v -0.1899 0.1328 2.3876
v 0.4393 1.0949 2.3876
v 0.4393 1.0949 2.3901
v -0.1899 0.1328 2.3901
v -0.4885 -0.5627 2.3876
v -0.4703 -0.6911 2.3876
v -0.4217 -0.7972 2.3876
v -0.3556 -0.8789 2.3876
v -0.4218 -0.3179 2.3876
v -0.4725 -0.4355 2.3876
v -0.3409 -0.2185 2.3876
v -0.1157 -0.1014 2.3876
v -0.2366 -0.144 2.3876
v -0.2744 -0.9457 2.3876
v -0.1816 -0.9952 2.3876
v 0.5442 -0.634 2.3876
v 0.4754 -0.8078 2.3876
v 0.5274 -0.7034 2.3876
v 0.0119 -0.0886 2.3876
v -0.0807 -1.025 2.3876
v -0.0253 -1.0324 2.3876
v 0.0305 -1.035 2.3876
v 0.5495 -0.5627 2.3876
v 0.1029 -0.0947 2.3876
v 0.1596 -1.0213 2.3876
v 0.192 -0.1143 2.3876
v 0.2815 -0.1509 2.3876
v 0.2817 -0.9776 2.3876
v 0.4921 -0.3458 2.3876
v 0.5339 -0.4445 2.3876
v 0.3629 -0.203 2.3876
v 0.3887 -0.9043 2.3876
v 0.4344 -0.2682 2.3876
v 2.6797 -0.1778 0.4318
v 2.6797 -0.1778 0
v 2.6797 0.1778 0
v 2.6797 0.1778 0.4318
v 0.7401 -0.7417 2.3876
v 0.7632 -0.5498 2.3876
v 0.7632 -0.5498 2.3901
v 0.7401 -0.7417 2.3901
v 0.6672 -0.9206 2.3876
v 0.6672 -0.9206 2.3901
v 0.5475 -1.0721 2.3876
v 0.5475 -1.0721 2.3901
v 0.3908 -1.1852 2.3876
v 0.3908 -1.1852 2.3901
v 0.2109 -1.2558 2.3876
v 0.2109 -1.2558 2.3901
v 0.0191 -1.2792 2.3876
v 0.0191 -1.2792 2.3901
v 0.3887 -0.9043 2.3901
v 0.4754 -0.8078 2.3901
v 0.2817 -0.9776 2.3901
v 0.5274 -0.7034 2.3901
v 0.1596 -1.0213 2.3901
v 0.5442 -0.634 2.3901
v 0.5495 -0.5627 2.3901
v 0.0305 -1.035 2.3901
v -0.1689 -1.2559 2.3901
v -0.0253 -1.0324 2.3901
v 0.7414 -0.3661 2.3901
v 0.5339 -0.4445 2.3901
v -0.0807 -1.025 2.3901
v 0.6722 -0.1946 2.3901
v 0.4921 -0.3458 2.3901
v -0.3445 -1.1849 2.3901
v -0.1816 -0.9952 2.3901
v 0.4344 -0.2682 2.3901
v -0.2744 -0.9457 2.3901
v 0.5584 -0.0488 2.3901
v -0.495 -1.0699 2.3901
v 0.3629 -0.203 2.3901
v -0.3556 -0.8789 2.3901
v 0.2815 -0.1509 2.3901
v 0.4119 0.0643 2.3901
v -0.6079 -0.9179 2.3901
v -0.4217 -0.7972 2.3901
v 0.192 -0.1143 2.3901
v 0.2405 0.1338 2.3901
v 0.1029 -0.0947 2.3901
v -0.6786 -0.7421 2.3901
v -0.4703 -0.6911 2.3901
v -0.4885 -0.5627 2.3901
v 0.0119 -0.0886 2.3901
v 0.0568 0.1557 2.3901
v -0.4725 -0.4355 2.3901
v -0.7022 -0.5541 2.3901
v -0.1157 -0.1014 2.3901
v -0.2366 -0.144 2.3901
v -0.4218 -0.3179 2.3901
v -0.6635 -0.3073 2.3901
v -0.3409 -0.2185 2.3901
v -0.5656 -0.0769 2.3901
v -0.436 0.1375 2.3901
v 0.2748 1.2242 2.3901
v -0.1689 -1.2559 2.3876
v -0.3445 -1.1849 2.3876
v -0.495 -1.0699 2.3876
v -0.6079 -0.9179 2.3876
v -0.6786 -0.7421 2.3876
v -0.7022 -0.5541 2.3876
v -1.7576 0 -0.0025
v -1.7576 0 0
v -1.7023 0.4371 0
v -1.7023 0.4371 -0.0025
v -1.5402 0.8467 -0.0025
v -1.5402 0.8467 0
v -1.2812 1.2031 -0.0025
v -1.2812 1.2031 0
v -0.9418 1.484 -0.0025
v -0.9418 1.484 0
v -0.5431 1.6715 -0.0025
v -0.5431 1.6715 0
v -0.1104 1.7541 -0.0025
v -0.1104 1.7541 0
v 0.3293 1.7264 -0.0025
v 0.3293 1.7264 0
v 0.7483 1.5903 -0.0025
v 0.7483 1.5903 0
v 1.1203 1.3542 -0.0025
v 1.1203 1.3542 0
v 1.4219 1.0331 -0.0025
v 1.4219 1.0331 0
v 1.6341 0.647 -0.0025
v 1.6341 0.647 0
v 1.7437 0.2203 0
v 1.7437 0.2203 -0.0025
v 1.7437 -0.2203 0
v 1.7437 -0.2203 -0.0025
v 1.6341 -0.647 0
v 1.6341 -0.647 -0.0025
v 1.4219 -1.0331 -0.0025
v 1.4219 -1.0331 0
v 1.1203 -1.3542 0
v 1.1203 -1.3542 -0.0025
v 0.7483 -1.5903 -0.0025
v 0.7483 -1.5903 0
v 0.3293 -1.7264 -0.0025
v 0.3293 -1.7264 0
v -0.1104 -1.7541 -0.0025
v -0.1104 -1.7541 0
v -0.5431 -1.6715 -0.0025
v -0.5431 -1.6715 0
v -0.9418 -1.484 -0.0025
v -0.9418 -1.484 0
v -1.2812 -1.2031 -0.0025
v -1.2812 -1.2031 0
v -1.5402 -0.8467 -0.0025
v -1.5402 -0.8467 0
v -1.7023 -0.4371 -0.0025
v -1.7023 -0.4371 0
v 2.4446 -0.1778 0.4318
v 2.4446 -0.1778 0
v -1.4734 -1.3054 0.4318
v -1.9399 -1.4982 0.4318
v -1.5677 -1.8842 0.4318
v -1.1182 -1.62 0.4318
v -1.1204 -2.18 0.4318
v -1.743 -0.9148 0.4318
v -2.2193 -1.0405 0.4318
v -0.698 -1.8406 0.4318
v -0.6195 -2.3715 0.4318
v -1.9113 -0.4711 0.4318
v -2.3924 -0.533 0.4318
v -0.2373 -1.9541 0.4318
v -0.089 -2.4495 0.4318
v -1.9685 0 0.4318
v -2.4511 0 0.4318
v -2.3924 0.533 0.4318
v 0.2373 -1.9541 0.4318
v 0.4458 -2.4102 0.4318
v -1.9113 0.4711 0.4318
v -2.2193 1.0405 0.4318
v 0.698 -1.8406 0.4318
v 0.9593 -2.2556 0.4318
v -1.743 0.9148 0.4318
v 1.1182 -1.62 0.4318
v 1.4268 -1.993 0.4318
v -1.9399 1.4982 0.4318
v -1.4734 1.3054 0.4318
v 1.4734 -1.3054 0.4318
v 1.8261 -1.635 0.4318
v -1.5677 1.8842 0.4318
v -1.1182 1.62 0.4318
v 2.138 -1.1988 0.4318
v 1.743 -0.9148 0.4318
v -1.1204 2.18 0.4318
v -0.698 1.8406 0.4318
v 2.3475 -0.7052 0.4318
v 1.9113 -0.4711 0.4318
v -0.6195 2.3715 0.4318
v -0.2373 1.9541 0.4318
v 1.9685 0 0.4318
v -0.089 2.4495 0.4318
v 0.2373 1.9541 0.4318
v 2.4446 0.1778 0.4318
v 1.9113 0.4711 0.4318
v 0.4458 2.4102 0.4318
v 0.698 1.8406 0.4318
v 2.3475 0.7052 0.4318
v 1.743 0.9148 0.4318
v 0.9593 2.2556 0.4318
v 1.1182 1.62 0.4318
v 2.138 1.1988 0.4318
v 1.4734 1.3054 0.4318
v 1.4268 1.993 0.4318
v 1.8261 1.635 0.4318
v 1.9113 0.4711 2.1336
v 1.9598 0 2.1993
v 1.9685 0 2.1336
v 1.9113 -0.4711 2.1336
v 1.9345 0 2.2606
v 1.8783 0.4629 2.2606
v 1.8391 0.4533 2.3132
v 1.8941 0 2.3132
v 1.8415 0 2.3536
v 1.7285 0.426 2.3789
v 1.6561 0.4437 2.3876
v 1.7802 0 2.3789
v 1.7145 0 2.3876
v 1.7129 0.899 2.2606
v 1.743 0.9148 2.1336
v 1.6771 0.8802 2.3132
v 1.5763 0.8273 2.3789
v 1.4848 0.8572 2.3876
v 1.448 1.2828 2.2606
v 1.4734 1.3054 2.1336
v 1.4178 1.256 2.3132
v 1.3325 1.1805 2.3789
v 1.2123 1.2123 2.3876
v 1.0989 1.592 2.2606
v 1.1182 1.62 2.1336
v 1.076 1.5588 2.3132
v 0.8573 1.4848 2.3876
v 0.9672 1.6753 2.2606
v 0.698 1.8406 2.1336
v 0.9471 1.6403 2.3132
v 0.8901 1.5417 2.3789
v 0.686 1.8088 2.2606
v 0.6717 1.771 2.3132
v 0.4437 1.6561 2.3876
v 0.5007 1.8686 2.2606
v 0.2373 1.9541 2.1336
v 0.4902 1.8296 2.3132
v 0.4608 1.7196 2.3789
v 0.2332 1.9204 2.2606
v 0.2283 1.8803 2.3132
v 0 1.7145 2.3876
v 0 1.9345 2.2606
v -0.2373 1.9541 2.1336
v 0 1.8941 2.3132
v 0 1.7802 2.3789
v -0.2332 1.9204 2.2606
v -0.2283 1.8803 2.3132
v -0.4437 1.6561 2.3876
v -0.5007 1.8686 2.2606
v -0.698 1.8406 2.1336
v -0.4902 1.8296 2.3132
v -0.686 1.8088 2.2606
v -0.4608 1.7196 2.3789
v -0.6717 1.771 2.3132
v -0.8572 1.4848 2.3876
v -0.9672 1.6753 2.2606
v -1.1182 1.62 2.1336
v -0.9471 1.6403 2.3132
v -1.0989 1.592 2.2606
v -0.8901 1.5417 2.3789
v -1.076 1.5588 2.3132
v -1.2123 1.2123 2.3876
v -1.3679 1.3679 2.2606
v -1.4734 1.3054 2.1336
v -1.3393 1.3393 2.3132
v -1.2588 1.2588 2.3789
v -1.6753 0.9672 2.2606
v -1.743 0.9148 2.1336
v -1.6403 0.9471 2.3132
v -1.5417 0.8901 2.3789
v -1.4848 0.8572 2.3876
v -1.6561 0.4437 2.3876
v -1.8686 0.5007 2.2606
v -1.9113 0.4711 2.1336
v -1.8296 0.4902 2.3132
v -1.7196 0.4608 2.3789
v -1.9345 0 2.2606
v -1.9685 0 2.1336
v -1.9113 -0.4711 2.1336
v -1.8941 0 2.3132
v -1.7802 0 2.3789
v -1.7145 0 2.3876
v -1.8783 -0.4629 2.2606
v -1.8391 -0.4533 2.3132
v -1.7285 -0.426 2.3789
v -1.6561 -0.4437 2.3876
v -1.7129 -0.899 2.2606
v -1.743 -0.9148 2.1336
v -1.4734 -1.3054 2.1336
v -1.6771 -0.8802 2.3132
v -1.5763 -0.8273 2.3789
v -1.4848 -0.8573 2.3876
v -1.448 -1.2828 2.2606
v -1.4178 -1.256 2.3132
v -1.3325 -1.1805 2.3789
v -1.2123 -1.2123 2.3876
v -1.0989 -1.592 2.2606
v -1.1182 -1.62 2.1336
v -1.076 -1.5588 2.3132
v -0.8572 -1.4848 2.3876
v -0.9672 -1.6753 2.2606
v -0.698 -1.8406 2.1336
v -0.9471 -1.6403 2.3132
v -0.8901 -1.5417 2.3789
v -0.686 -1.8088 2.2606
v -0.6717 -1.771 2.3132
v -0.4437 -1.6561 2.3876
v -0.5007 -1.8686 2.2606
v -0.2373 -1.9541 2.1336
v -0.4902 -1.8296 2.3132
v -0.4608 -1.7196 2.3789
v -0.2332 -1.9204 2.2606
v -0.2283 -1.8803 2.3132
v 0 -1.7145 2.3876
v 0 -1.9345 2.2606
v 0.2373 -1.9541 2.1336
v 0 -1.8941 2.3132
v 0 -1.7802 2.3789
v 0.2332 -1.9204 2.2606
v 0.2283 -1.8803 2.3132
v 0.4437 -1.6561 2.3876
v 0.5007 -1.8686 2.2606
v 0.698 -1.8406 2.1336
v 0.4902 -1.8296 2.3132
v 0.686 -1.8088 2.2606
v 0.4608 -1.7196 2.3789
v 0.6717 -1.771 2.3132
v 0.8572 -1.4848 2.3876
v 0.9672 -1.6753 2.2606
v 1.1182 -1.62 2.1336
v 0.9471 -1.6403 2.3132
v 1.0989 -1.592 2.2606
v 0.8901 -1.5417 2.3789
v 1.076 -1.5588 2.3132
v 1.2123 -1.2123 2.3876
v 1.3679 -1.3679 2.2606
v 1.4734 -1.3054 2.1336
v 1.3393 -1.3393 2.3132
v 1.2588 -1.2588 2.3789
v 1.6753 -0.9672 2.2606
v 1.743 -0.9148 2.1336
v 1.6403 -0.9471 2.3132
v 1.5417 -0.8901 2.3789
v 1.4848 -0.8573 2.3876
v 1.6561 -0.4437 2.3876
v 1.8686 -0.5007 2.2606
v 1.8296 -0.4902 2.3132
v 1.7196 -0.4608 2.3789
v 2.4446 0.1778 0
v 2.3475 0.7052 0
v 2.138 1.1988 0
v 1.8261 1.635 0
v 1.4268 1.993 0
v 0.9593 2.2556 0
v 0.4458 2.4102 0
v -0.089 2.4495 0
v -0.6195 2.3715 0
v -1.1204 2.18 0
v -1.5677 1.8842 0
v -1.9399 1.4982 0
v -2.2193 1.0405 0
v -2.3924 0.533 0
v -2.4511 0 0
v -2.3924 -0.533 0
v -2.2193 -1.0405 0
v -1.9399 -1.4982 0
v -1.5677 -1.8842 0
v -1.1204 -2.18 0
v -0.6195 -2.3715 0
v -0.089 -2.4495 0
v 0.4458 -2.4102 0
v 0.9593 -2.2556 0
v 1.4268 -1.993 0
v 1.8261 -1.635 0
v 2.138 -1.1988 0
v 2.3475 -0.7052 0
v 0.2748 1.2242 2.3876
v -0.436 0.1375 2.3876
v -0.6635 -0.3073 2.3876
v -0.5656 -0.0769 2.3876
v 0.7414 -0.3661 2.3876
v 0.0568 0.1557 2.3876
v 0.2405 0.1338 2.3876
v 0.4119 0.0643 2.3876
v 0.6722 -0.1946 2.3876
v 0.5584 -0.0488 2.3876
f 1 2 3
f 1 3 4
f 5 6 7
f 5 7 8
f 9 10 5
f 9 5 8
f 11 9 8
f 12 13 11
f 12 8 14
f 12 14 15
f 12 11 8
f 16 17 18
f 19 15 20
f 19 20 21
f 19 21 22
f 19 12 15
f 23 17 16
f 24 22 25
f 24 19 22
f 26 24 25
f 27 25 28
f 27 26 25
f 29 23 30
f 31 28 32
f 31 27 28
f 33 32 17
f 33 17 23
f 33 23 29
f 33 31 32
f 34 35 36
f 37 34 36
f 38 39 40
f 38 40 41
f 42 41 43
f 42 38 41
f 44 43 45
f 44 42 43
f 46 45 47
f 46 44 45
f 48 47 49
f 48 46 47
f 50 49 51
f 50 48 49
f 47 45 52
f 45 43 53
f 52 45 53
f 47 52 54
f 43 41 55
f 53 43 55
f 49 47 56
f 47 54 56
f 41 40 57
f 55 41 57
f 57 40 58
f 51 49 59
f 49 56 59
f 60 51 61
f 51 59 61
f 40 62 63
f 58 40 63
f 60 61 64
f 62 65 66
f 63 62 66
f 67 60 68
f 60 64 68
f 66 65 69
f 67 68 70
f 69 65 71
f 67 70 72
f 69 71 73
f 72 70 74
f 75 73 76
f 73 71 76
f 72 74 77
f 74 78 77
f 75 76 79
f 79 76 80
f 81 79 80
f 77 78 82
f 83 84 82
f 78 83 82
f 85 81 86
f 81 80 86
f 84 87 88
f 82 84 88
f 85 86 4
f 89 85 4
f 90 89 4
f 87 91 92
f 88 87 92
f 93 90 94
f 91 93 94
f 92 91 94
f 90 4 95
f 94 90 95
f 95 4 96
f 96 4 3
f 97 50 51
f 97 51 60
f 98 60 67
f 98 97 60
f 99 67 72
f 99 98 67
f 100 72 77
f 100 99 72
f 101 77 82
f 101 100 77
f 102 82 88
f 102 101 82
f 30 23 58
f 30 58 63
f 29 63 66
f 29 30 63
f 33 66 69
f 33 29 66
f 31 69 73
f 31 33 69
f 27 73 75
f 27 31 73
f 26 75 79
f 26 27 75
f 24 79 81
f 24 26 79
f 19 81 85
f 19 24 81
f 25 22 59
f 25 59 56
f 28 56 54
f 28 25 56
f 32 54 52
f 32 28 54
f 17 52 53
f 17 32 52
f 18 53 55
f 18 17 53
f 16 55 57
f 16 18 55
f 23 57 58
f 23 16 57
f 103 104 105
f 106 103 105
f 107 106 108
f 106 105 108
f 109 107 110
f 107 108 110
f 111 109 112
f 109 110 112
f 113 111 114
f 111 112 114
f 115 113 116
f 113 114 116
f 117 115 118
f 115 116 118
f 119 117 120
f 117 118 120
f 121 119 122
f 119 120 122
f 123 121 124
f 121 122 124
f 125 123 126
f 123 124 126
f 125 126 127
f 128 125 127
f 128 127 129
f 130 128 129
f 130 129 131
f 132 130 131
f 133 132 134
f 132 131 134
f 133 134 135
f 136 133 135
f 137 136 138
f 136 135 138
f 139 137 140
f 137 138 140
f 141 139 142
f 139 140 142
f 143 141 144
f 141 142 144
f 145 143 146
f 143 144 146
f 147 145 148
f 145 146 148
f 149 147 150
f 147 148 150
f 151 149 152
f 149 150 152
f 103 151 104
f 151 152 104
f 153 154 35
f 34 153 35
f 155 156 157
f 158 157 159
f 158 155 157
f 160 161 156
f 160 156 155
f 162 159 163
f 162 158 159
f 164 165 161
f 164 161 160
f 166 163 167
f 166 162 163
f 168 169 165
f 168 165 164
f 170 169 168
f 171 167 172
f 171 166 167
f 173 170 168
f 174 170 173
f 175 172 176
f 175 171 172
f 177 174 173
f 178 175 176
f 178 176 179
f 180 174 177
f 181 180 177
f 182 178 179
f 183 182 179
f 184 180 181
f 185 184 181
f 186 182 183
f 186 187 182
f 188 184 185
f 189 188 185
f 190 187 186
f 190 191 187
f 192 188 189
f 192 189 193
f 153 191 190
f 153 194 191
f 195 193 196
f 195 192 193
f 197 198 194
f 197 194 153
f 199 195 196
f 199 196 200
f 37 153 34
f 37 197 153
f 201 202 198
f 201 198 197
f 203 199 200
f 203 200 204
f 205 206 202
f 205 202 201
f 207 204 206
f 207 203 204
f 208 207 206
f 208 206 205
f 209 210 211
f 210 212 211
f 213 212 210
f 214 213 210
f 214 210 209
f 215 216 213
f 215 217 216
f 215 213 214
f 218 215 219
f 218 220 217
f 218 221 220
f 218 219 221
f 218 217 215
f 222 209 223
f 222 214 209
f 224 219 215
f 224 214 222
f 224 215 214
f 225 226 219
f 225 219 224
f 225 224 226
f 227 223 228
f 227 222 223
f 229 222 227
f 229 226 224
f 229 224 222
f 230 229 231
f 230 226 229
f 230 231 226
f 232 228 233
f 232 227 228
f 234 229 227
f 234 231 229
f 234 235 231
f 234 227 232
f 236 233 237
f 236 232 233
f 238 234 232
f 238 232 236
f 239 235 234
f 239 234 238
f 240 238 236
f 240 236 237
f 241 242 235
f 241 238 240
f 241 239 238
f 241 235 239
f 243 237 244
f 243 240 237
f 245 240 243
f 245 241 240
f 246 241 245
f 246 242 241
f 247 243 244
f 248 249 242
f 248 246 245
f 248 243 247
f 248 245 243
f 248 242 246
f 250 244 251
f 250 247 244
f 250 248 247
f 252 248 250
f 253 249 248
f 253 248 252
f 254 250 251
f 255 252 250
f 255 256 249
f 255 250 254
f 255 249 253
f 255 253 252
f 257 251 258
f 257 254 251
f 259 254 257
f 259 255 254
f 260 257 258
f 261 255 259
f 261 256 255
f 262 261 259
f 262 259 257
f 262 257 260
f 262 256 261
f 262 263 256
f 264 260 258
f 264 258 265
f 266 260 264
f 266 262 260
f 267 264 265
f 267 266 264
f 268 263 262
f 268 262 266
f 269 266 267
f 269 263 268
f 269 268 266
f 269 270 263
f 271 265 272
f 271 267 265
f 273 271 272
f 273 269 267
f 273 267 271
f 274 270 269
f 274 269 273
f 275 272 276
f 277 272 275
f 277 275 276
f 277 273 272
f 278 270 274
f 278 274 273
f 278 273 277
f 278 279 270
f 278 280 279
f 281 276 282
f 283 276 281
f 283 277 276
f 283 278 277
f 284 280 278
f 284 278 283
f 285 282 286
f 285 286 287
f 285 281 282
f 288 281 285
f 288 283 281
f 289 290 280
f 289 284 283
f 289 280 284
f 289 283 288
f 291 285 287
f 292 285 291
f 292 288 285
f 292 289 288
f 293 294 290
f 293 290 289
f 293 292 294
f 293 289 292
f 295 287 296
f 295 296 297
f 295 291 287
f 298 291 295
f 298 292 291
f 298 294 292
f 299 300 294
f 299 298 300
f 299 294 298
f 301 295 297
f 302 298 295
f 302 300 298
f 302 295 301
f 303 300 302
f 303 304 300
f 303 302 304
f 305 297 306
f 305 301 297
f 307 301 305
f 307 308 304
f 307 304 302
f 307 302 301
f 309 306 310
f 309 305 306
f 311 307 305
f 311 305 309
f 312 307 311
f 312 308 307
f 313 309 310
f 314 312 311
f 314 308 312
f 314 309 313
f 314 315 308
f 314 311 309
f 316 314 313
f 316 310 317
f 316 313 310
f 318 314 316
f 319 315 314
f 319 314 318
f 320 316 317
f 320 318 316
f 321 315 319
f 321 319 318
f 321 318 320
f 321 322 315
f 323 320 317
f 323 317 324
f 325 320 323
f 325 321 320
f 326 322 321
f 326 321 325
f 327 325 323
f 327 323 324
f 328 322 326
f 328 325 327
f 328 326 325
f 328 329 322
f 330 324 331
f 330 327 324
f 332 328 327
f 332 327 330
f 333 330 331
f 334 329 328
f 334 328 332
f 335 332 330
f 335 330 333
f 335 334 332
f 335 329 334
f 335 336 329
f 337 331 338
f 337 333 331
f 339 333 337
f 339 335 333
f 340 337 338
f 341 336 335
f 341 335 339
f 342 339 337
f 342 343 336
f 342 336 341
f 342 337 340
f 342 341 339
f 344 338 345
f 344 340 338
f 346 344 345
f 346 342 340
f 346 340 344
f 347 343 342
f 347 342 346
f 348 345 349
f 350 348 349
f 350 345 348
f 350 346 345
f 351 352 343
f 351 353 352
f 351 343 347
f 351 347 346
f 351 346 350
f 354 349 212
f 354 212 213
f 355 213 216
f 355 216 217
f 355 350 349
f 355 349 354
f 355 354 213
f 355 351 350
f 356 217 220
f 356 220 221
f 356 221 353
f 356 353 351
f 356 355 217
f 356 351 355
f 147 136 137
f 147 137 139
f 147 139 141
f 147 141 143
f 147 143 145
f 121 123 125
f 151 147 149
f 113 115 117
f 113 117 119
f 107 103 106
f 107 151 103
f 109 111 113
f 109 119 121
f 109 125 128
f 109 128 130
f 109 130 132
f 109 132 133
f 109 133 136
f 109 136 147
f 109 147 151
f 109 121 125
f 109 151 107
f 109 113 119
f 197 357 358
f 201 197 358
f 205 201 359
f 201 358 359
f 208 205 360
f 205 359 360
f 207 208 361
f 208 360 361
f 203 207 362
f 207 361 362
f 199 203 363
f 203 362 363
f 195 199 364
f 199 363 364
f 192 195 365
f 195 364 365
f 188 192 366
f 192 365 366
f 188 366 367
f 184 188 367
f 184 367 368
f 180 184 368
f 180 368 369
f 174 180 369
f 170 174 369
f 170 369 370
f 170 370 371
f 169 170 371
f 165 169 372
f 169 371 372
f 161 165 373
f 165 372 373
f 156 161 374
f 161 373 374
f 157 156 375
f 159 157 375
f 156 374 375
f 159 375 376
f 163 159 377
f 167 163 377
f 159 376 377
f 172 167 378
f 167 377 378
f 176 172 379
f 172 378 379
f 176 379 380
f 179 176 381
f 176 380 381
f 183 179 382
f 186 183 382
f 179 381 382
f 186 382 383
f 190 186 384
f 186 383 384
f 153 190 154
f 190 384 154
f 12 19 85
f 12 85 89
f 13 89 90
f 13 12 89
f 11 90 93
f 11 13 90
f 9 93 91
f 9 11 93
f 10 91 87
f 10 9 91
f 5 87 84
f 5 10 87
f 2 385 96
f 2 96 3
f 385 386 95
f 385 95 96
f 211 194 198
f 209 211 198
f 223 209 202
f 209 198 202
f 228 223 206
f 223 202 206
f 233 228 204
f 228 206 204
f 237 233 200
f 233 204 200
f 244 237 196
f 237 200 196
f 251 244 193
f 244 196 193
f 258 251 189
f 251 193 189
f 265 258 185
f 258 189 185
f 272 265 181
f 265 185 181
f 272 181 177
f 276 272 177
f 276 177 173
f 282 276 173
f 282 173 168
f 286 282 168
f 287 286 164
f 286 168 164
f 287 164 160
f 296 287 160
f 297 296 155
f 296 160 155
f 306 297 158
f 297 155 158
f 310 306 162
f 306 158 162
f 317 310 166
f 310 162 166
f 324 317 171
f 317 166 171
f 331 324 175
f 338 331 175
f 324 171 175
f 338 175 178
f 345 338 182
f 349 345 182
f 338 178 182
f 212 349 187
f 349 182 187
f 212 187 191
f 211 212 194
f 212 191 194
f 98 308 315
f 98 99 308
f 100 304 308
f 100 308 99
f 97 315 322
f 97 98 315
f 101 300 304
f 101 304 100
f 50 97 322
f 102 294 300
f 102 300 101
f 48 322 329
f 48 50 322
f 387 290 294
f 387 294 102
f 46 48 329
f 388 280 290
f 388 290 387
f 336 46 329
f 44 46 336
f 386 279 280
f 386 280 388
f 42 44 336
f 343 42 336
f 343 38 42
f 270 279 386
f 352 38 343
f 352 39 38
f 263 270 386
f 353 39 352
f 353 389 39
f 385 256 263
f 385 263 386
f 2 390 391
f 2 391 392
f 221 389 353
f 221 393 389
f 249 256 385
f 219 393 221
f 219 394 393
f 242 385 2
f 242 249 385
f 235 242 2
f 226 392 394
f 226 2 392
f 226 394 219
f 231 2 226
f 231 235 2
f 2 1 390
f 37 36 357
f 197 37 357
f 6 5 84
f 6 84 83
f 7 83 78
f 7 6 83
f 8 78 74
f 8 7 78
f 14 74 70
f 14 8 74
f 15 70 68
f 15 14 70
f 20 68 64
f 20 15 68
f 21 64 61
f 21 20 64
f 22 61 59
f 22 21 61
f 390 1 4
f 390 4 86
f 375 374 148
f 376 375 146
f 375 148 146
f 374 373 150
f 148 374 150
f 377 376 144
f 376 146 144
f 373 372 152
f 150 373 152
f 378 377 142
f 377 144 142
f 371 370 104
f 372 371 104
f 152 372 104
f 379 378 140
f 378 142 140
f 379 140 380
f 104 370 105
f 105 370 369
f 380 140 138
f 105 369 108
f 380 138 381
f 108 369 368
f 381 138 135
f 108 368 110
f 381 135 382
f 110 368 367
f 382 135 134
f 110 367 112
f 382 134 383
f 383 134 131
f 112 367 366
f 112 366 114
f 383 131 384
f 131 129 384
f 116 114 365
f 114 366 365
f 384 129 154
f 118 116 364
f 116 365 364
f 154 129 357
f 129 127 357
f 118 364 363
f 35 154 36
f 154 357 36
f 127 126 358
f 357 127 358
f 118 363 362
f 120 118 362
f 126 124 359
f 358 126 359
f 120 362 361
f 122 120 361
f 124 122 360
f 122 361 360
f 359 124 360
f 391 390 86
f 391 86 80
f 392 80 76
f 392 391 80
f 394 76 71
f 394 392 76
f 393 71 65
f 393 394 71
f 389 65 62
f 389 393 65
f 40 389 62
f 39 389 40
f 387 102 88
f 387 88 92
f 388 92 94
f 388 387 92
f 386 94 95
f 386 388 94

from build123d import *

# Parameters (mm, degrees)
BOSS_EXTRUDE1_DEPTH = 0.4318
SKETCH2_R           = 1.9685
BOSS_EXTRUDE2_DEPTH = 1.9558
SKETCH3_R           = 1.757566481
BOSS_EXTRUDE3_DEPTH = 0.00254
FILLET1_R           = 0.254
BOSS_EXTRUDE6_DEPTH = 0.00254


with BuildPart() as part:
    # Sketch1 → Boss-Extrude1 (new body)
    with BuildSketch(Plane.XY):
        with BuildLine():
            Line((2.6797, 0.1778), (2.4511, 0.1778))
            Line((2.4511, 0.1778), (2.44464279, 0.1778))
            ThreePointArc((2.44464279, 0.1778), (-2.4511, 0), (2.44464279, -0.1778))
            Line((2.44464279, -0.1778), (2.4511, -0.1778))
            Line((2.4511, -0.1778), (2.6797, -0.1778))
            Line((2.6797, -0.1778), (2.6797, 0.1778))
        make_face()
    extrude(amount=BOSS_EXTRUDE1_DEPTH)

    # Sketch2 → Boss-Extrude2 (add)
    with BuildSketch(Plane.XY.offset(0.4318)):
        Circle(SKETCH2_R)
    extrude(amount=BOSS_EXTRUDE2_DEPTH)

    # Sketch3 → Boss-Extrude3 (add)
    with BuildSketch(Plane(origin=(0, 0, 0), x_dir=(-1, 0, 0), z_dir=(0, 0, -1))):
        Circle(SKETCH3_R)
    extrude(amount=BOSS_EXTRUDE3_DEPTH)

    # Fillet1
    fillet1_edges = [part.edges().sort_by_distance(p)[0] for p in [
        (-1.9685, 0, 2.3876),
    ]]
    fillet(fillet1_edges, radius=FILLET1_R)

    # Sketch4 → Boss-Extrude6 (add)
    with BuildSketch(Plane.XY.offset(2.3876)):
        with BuildLine():
            Line((0.274759615, 1.224166485), (0.439329177, 1.094895902))
            Line((0.439329177, 1.094895902), (-0.189851262, 0.132760235))
            add(Edge.make_bspline(
                [(-0.189851262, 0.132760235), (-0.147961484, 0.139437166), (-0.066250736, 0.152461273), (0.016457491, 0.154609804), (0.056764573, 0.15565687)],
                knots=[0, 0, 0, 0, 0.000127097, 0.000247917, 0.000247917, 0.000247917, 0.000247917], degree=3))
            add(Edge.make_bspline(
                [(0.056764573, 0.15565687), (0.080966575, 0.155006373), (0.128607496, 0.153725888), (0.198552838, 0.143871696), (0.265764596, 0.128342469), (0.329964193, 0.105705452), (0.391382061, 0.076788671), (0.450370656, 0.042132047), (0.505821131, -5.3961e-05), (0.558447558, -0.047178868), (0.606227065, -0.099373816), (0.648528989, -0.154755797), (0.684061859, -0.213267111), (0.71289126, -0.274878122), (0.735278329, -0.339493857), (0.751598495, -0.407031645), (0.761245682, -0.477538057), (0.762555703, -0.525488387), (0.763221154, -0.549845684)],
                knots=[0, 0, 0, 0, 7.2583e-05, 0.000142877, 0.000211489, 0.000279227, 0.00034666, 0.000414888, 0.000484054, 0.000555321, 0.000626556, 0.00069601, 0.000764075, 0.000831507, 0.000899695, 0.000968882, 0.001039649, 0.001112708, 0.001112708, 0.001112708, 0.001112708], degree=3))
            add(Edge.make_bspline(
                [(0.763221154, -0.549845684), (0.762252934, -0.583169376), (0.760347707, -0.648742514), (0.74136316, -0.744248809), (0.711863116, -0.835234681), (0.669696262, -0.920247464), (0.617320748, -0.99917064), (0.553450457, -1.069101466), (0.480350513, -1.131469831), (0.397696102, -1.183623709), (0.308744192, -1.226216142), (0.21529578, -1.256808566), (0.118258382, -1.275643212), (0.052396675, -1.278004461), (0.019080529, -1.279198899)],
                knots=[0, 0, 0, 0, 9.986e-05, 0.000196501, 0.00029093, 0.000386076, 0.000480274, 0.000574162, 0.00066926, 0.000767711, 0.0008665, 0.000964399, 0.001061977, 0.001161866, 0.001161866, 0.001161866, 0.001161866], degree=3))
            add(Edge.make_bspline(
                [(0.019080529, -1.279198899), (-0.012962048, -1.278159174), (-0.076432782, -1.276099659), (-0.169800094, -1.257753191), (-0.25951404, -1.228016751), (-0.344946065, -1.187049536), (-0.424085625, -1.135303013), (-0.494887424, -1.073007962), (-0.556998435, -1.001495987), (-0.608688311, -0.920778179), (-0.649685769, -0.834039476), (-0.680431058, -0.743594732), (-0.69838993, -0.649773494), (-0.700899466, -0.586172933), (-0.702163462, -0.554138803)],
                knots=[0, 0, 0, 0, 9.605e-05, 0.000190259, 0.000284235, 0.000378964, 0.000473693, 0.000566986, 0.000660997, 0.000756925, 0.000853581, 0.000948161, 0.001042839, 0.001138919, 0.001138919, 0.001138919, 0.001138919], degree=3))
            add(Edge.make_bspline(
                [(-0.702163462, -0.554138803), (-0.701359657, -0.529615613), (-0.699718442, -0.479543946), (-0.688258921, -0.403708598), (-0.669845194, -0.32611313), (-0.649223402, -0.260285723), (-0.627434549, -0.206359581), (-0.609301303, -0.162882384), (-0.586731138, -0.118141369), (-0.562664606, -0.070602341), (-0.534935379, -0.021490466), (-0.50478491, 0.030015066), (-0.471379612, 0.08309512), (-0.447961608, 0.119116082), (-0.435990084, 0.137530368)],
                knots=[0, 0, 0, 0, 7.3559e-05, 0.000150194, 0.000229567, 0.000312689, 0.000356802, 0.000404029, 0.000453949, 0.000507071, 0.000563874, 0.000623104, 0.000686106, 0.000751998, 0.000751998, 0.000751998, 0.000751998], degree=3))
            Line((-0.435990084, 0.137530368), (0.274759615, 1.224166485))
        make_face()
        with BuildLine():
            add(Edge.make_bspline(
                [(0.011925331, -0.088573899), (-0.006214518, -0.089103247), (-0.041646912, -0.090137216), (-0.093631243, -0.09614154), (-0.14283008, -0.10744844), (-0.189895237, -0.121849105), (-0.233946799, -0.141649579), (-0.27530492, -0.165701428), (-0.314129536, -0.194018694), (-0.350013988, -0.226200207), (-0.382548438, -0.261434565), (-0.410566314, -0.299173651), (-0.434734233, -0.338507957), (-0.454384185, -0.379766135), (-0.469685468, -0.422932414), (-0.480753689, -0.467808261), (-0.486913473, -0.514694601), (-0.487938249, -0.546489393), (-0.488461538, -0.562725041)],
                knots=[0, 0, 0, 0, 5.4432e-05, 0.000106321, 0.000156664, 0.000205694, 0.00025374, 0.000301192, 0.000348994, 0.00039764, 0.000445579, 0.000492613, 0.000538426, 0.000583872, 0.000629437, 0.000675598, 0.000722282, 0.000770996, 0.000770996, 0.000770996, 0.000770996], degree=3))
            add(Edge.make_bspline(
                [(-0.488461538, -0.562725041), (-0.488035389, -0.578815474), (-0.487199773, -0.610366417), (-0.479612213, -0.656861466), (-0.468022273, -0.701605091), (-0.450781753, -0.744366625), (-0.430216674, -0.78579787), (-0.403066802, -0.824398127), (-0.372983596, -0.862511782), (-0.337024045, -0.897210997), (-0.298431899, -0.92949845), (-0.257201438, -0.957719837), (-0.214230109, -0.981863109), (-0.168937766, -1.000784588), (-0.121967008, -1.016313254), (-0.072926489, -1.027240796), (-0.021782099, -1.033418797), (0.012863005, -1.034444907), (0.030528846, -1.03496813)],
                knots=[0, 0, 0, 0, 4.8237e-05, 9.4586e-05, 0.000140984, 0.000186603, 0.000232684, 0.000279387, 0.000327886, 0.000378144, 0.000428959, 0.000478708, 0.00052782, 0.00057655, 0.000625726, 0.000676069, 0.000727011, 0.000780013, 0.000780013, 0.000780013, 0.000780013], degree=3))
            add(Edge.make_bspline(
                [(0.030528846, -1.03496813), (0.048194659, -1.034444866), (0.082839706, -1.033418676), (0.133984507, -1.027241258), (0.183023506, -1.01631156), (0.229999791, -1.000790729), (0.275271729, -0.981840327), (0.318205477, -0.957870038), (0.359046019, -0.929324894), (0.397663498, -0.897266174), (0.433473374, -0.862314287), (0.464278094, -0.824738351), (0.490596508, -0.785485897), (0.511982982, -0.744529833), (0.529033611, -0.701579235), (0.540682323, -0.656868393), (0.548254214, -0.610364604), (0.549091983, -0.578814861), (0.549519231, -0.562725041)],
                knots=[0, 0, 0, 0, 5.3002e-05, 0.000103944, 0.000154287, 0.000203463, 0.000252193, 0.000301305, 0.000350661, 0.000401476, 0.000451735, 0.000500535, 0.000546972, 0.000593272, 0.000638891, 0.000685289, 0.000731638, 0.000779875, 0.000779875, 0.000779875, 0.000779875], degree=3))
            add(Edge.make_bspline(
                [(0.549519231, -0.562725041), (0.549144835, -0.546468213), (0.548410018, -0.514561346), (0.54009881, -0.467829234), (0.528571945, -0.422704406), (0.511166347, -0.379470466), (0.488553627, -0.338298022), (0.461010451, -0.298979094), (0.429147578, -0.261212233), (0.39234193, -0.226131108), (0.352275539, -0.194054256), (0.309674578, -0.165738094), (0.26510576, -0.141840565), (0.218614275, -0.121901269), (0.16966742, -0.107512073), (0.119055422, -0.09618192), (0.066130955, -0.090152583), (0.030224013, -0.08910683), (0.011925331, -0.088573899)],
                knots=[0, 0, 0, 0, 4.8714e-05, 9.5609e-05, 0.000142007, 0.000188246, 0.000234995, 0.000282632, 0.000332044, 0.000382986, 0.000434911, 0.000485846, 0.000536213, 0.000586447, 0.0006373, 0.00068904, 0.000741877, 0.000796785, 0.000796785, 0.000796785, 0.000796785], degree=3))
        make_face(mode=Mode.SUBTRACT)
    extrude(amount=BOSS_EXTRUDE6_DEPTH)


solid = part.part
